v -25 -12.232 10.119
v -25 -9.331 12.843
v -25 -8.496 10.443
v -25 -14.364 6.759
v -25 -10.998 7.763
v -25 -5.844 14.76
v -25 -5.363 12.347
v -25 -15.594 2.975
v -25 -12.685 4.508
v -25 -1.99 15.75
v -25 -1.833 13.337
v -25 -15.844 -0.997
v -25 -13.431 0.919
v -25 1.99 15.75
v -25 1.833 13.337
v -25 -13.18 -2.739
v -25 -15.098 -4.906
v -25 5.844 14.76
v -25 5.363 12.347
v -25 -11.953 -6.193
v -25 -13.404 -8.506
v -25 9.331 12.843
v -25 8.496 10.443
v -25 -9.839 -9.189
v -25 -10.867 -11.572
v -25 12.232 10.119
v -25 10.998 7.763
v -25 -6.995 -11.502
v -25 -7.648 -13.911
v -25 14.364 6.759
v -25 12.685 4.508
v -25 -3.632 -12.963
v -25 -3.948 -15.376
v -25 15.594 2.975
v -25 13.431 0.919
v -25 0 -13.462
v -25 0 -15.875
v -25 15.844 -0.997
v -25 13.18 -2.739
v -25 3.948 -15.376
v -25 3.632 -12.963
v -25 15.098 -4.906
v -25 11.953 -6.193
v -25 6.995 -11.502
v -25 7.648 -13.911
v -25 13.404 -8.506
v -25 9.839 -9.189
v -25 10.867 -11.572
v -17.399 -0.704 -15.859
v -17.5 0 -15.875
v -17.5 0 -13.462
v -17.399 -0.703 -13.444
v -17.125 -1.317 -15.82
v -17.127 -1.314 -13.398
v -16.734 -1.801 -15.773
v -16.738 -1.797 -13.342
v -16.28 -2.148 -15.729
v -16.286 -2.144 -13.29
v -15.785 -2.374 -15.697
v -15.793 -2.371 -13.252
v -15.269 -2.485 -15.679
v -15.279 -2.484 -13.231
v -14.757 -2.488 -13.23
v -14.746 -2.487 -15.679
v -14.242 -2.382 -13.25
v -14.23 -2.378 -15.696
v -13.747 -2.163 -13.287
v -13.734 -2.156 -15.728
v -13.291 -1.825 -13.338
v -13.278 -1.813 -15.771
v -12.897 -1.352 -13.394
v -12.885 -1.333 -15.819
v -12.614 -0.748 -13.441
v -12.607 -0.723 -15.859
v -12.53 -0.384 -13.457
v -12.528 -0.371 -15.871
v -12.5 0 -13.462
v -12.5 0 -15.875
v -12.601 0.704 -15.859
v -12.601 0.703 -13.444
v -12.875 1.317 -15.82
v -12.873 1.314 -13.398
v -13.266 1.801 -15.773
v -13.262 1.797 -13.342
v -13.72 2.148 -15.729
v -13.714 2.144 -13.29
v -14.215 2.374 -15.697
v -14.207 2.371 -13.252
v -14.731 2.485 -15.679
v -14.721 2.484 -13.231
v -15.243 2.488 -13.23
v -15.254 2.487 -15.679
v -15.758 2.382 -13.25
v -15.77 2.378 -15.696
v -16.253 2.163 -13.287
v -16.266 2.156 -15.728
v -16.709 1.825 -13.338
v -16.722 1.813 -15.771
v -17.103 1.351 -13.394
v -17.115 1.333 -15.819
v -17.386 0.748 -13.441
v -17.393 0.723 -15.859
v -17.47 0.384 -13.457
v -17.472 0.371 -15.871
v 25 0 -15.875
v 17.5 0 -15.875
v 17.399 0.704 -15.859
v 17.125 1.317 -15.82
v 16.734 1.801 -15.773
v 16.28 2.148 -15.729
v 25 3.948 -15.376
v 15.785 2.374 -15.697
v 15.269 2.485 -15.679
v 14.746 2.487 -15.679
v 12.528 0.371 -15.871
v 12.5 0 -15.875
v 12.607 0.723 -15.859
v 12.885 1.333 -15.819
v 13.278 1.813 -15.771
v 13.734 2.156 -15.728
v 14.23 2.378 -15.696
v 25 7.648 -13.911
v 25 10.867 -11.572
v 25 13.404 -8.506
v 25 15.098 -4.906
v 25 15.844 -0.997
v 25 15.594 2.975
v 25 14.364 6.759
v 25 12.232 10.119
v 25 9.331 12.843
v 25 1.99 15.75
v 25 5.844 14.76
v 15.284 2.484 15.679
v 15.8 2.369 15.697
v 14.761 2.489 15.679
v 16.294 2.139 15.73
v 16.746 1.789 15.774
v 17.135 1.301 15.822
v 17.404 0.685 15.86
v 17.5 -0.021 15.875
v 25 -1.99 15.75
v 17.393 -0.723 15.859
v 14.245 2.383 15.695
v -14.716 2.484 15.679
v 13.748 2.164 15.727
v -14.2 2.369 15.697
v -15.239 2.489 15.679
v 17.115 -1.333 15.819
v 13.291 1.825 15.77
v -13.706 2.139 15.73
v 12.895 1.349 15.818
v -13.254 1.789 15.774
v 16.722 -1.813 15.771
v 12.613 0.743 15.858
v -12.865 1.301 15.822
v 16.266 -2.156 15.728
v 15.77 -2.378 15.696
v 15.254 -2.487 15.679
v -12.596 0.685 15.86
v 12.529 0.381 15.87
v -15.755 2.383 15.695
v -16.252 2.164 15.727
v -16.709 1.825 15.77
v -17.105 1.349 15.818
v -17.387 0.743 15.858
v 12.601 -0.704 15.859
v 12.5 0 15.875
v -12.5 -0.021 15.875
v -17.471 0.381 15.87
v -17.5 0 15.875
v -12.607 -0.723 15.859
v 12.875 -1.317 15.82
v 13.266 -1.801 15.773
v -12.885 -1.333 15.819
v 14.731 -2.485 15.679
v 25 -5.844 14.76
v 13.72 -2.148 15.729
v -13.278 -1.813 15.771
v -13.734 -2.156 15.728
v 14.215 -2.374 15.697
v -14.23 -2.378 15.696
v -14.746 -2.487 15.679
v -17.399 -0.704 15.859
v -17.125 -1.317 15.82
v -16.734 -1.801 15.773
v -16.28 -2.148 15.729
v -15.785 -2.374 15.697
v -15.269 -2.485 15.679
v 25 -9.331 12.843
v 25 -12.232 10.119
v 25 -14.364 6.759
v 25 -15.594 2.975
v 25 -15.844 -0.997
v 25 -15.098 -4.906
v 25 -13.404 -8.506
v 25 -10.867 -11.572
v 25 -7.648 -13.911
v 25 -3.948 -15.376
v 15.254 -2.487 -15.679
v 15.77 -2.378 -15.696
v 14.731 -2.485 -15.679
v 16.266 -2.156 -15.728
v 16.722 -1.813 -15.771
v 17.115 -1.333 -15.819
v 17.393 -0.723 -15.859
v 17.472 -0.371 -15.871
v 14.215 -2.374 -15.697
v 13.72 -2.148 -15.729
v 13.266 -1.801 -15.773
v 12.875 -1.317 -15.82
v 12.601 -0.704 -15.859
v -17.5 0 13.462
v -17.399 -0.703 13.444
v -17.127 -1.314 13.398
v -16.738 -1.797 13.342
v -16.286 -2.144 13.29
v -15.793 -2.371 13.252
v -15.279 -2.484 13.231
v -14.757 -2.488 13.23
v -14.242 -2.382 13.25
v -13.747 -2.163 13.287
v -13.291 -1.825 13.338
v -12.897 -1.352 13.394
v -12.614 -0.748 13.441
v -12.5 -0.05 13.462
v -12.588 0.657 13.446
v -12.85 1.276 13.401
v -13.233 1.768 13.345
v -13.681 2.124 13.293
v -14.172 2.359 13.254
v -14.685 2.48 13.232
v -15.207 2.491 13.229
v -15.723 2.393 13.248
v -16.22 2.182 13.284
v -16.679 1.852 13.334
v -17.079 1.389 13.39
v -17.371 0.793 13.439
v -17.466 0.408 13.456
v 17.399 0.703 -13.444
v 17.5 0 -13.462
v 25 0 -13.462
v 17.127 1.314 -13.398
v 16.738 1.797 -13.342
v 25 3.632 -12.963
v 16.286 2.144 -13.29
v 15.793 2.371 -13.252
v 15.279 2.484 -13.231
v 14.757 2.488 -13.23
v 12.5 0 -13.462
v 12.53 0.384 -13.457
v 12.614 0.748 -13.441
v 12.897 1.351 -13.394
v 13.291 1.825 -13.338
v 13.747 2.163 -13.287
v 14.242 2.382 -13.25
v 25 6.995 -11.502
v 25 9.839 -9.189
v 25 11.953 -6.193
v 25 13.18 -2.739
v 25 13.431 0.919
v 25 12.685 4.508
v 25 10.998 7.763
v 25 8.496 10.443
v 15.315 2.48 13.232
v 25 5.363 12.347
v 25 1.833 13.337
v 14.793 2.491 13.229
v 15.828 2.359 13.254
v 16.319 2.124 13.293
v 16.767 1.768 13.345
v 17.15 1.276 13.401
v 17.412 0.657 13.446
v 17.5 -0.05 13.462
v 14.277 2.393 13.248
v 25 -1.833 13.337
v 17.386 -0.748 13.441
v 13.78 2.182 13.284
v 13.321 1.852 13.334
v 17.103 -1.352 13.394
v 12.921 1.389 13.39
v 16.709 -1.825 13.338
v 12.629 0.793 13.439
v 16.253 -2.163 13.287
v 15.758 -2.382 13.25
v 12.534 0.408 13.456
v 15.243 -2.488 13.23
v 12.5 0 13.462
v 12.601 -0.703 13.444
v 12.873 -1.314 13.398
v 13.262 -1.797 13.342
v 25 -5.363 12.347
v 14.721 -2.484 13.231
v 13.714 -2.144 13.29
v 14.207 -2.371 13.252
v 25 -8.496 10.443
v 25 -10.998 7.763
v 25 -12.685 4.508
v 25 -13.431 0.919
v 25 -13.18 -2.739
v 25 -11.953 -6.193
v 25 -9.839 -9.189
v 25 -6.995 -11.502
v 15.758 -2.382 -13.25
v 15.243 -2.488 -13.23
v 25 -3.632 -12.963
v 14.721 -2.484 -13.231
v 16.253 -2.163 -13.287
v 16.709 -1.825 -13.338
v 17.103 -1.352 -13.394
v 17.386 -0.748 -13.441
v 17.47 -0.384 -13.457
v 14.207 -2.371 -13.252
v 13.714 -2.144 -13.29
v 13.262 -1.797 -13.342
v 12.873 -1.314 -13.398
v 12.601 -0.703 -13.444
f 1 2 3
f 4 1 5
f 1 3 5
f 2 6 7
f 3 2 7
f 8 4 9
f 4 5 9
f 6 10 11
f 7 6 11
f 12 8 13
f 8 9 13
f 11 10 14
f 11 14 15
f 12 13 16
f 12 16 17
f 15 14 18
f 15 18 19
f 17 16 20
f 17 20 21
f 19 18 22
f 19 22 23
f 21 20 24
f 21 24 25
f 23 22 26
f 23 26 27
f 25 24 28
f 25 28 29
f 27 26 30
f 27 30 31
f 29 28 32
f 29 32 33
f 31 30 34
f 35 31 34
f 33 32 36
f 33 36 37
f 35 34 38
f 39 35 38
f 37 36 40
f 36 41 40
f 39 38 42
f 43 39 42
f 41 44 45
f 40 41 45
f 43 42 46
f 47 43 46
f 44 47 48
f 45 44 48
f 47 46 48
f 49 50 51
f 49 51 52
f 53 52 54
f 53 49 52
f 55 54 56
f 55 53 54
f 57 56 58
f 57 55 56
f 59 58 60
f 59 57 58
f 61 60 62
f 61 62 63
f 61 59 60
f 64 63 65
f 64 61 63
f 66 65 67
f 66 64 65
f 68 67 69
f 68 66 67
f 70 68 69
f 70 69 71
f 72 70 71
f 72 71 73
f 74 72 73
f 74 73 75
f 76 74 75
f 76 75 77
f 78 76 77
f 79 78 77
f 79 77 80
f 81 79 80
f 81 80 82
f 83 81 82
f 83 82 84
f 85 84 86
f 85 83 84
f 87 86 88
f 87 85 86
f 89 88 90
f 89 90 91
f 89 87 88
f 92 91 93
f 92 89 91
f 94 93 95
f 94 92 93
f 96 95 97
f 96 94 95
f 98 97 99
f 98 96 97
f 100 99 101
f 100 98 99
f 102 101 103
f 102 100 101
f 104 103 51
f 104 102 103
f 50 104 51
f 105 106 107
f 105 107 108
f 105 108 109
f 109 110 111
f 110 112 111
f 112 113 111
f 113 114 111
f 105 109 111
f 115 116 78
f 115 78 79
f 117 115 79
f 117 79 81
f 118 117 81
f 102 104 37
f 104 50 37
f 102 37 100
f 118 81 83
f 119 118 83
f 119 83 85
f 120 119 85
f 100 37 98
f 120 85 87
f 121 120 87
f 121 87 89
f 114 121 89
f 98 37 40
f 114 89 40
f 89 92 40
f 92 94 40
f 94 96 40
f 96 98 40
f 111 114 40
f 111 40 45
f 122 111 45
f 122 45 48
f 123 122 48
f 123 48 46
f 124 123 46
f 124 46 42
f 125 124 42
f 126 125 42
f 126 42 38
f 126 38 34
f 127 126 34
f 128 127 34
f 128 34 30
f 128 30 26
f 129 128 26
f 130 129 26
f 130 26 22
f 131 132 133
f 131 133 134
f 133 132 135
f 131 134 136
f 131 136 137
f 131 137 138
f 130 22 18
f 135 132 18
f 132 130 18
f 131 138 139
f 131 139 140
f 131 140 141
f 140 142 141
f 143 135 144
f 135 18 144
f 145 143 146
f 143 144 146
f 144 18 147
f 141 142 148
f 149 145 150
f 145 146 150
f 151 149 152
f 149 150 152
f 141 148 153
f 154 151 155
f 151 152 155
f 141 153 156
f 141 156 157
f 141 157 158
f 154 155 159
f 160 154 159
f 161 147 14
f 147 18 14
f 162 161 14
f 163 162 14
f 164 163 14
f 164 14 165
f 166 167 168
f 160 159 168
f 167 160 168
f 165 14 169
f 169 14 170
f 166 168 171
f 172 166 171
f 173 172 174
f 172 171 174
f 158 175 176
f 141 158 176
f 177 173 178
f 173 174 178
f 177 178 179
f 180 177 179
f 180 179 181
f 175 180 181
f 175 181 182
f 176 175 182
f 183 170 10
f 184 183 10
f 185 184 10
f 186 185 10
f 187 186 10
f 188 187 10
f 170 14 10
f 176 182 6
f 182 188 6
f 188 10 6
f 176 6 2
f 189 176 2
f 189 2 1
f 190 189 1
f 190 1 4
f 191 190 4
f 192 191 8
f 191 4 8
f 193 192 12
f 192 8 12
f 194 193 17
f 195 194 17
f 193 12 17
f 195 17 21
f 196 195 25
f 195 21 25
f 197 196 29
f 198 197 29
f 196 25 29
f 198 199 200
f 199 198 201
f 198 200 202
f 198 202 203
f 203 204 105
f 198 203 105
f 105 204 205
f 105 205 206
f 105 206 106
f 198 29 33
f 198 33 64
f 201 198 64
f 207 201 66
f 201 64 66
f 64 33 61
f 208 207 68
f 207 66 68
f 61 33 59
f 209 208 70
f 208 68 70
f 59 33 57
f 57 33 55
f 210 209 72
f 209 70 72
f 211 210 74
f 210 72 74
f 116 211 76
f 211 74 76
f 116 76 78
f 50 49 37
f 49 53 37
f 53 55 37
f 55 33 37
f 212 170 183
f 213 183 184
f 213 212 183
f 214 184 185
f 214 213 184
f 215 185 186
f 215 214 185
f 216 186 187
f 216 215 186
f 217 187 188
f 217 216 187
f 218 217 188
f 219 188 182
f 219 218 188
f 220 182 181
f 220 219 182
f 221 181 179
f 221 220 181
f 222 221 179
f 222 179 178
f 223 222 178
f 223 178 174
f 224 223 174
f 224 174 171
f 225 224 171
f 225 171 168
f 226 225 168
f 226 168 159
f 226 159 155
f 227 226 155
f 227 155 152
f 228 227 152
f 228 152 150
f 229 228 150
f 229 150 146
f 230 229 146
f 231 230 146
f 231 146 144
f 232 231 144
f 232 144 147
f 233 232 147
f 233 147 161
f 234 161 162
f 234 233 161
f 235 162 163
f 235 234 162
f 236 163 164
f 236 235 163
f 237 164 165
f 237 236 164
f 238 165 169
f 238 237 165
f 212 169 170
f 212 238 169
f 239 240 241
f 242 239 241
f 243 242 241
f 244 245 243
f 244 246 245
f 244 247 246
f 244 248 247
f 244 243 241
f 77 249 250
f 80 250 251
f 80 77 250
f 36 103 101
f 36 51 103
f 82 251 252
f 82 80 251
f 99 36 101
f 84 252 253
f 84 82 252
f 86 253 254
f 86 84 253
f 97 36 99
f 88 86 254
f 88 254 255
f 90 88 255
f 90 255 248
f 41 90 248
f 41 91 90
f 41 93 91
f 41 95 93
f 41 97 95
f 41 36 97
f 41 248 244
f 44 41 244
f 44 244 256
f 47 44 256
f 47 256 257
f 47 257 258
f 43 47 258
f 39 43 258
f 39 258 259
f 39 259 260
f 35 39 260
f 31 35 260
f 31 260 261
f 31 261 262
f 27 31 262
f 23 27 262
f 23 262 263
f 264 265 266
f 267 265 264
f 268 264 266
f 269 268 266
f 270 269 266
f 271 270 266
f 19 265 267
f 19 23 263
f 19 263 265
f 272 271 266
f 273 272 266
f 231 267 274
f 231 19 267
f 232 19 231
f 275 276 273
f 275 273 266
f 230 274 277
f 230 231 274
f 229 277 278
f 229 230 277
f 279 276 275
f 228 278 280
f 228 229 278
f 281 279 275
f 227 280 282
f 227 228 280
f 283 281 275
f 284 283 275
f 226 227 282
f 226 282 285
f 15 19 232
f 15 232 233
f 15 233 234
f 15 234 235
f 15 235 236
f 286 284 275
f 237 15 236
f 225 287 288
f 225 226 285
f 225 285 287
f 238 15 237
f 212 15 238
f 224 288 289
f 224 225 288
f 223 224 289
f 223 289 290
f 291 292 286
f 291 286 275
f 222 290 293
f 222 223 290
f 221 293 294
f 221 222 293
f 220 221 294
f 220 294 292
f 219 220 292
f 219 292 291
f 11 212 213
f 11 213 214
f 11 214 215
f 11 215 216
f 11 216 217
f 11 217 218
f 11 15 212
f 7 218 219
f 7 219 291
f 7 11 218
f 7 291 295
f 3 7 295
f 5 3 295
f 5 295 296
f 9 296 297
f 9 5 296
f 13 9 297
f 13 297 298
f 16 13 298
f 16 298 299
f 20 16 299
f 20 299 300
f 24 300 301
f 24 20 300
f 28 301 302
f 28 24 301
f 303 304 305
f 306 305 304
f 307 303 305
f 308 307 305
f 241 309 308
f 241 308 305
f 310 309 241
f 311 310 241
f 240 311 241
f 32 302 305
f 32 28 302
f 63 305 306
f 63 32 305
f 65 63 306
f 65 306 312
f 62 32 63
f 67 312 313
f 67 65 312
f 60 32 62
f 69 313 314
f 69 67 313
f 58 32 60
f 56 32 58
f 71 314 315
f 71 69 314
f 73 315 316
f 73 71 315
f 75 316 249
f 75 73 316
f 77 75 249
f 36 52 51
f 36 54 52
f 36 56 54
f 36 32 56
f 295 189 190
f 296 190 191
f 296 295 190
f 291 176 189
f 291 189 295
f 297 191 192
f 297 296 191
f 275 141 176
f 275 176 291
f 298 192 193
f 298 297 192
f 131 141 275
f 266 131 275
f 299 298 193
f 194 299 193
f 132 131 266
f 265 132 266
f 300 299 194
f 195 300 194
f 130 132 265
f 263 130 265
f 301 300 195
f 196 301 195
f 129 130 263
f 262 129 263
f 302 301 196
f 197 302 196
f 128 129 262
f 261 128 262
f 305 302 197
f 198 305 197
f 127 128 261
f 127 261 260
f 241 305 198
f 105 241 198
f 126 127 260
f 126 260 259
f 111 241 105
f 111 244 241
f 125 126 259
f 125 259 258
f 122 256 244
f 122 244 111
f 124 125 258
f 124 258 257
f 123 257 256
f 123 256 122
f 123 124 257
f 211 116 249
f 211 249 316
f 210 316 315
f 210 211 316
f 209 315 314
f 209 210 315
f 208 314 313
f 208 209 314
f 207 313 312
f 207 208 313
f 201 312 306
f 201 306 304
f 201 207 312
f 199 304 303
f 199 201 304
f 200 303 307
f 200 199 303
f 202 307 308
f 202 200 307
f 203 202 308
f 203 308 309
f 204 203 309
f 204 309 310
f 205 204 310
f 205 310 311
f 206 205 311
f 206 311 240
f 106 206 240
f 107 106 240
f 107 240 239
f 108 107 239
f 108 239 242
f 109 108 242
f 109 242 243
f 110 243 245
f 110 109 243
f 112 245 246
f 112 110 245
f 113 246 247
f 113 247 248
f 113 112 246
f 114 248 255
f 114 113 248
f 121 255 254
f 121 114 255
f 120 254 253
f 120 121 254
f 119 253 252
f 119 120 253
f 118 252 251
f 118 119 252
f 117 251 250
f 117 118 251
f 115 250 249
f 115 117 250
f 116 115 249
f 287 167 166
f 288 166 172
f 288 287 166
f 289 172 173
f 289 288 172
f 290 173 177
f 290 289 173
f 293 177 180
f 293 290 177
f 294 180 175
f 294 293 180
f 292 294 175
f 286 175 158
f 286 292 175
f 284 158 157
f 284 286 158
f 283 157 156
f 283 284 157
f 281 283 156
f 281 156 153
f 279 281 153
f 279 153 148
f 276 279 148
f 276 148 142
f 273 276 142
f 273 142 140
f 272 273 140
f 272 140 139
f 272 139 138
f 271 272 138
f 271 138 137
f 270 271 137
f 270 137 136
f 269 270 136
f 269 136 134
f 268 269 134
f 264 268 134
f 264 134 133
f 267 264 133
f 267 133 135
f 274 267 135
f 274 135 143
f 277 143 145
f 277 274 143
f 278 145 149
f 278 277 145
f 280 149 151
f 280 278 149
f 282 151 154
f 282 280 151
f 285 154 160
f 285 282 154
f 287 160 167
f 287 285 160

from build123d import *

# Parameters (mm, degrees)
BOSS_EXTRUDE1_DEPTH      = 25
BOSS_EXTRUDE1_DEPTH_BACK = 25
SKETCH1_R                = 15.875
SKETCH1_R_2              = 13.462
CUT_EXTRUDE1_DEPTH       = 25
CUT_EXTRUDE1_DEPTH_BACK  = 25
SKETCH2_R                = 2.5


with BuildPart() as part:
    # Sketch1 → Boss-Extrude1 (new, two sides: drawn at the far end of the back side and taken through both)
    with BuildSketch(Plane(origin=(0, 0, 0), x_dir=(0, 0, -1), z_dir=(1, 0, 0)).offset(-BOSS_EXTRUDE1_DEPTH_BACK)):
        Circle(SKETCH1_R)
        Circle(SKETCH1_R_2, mode=Mode.SUBTRACT)
    extrude(amount=BOSS_EXTRUDE1_DEPTH + BOSS_EXTRUDE1_DEPTH_BACK)

    # Sketch2 → Cut-Extrude1 (cut, two sides: drawn at the far end of the back side and taken through both)
    with BuildSketch(Plane.XY.offset(-CUT_EXTRUDE1_DEPTH_BACK)):
        with Locations((-15, 0)):
            Circle(SKETCH2_R)
        with Locations((15, 0)):
            Circle(SKETCH2_R)
    extrude(amount=CUT_EXTRUDE1_DEPTH + CUT_EXTRUDE1_DEPTH_BACK, mode=Mode.SUBTRACT)


solid = part.part
